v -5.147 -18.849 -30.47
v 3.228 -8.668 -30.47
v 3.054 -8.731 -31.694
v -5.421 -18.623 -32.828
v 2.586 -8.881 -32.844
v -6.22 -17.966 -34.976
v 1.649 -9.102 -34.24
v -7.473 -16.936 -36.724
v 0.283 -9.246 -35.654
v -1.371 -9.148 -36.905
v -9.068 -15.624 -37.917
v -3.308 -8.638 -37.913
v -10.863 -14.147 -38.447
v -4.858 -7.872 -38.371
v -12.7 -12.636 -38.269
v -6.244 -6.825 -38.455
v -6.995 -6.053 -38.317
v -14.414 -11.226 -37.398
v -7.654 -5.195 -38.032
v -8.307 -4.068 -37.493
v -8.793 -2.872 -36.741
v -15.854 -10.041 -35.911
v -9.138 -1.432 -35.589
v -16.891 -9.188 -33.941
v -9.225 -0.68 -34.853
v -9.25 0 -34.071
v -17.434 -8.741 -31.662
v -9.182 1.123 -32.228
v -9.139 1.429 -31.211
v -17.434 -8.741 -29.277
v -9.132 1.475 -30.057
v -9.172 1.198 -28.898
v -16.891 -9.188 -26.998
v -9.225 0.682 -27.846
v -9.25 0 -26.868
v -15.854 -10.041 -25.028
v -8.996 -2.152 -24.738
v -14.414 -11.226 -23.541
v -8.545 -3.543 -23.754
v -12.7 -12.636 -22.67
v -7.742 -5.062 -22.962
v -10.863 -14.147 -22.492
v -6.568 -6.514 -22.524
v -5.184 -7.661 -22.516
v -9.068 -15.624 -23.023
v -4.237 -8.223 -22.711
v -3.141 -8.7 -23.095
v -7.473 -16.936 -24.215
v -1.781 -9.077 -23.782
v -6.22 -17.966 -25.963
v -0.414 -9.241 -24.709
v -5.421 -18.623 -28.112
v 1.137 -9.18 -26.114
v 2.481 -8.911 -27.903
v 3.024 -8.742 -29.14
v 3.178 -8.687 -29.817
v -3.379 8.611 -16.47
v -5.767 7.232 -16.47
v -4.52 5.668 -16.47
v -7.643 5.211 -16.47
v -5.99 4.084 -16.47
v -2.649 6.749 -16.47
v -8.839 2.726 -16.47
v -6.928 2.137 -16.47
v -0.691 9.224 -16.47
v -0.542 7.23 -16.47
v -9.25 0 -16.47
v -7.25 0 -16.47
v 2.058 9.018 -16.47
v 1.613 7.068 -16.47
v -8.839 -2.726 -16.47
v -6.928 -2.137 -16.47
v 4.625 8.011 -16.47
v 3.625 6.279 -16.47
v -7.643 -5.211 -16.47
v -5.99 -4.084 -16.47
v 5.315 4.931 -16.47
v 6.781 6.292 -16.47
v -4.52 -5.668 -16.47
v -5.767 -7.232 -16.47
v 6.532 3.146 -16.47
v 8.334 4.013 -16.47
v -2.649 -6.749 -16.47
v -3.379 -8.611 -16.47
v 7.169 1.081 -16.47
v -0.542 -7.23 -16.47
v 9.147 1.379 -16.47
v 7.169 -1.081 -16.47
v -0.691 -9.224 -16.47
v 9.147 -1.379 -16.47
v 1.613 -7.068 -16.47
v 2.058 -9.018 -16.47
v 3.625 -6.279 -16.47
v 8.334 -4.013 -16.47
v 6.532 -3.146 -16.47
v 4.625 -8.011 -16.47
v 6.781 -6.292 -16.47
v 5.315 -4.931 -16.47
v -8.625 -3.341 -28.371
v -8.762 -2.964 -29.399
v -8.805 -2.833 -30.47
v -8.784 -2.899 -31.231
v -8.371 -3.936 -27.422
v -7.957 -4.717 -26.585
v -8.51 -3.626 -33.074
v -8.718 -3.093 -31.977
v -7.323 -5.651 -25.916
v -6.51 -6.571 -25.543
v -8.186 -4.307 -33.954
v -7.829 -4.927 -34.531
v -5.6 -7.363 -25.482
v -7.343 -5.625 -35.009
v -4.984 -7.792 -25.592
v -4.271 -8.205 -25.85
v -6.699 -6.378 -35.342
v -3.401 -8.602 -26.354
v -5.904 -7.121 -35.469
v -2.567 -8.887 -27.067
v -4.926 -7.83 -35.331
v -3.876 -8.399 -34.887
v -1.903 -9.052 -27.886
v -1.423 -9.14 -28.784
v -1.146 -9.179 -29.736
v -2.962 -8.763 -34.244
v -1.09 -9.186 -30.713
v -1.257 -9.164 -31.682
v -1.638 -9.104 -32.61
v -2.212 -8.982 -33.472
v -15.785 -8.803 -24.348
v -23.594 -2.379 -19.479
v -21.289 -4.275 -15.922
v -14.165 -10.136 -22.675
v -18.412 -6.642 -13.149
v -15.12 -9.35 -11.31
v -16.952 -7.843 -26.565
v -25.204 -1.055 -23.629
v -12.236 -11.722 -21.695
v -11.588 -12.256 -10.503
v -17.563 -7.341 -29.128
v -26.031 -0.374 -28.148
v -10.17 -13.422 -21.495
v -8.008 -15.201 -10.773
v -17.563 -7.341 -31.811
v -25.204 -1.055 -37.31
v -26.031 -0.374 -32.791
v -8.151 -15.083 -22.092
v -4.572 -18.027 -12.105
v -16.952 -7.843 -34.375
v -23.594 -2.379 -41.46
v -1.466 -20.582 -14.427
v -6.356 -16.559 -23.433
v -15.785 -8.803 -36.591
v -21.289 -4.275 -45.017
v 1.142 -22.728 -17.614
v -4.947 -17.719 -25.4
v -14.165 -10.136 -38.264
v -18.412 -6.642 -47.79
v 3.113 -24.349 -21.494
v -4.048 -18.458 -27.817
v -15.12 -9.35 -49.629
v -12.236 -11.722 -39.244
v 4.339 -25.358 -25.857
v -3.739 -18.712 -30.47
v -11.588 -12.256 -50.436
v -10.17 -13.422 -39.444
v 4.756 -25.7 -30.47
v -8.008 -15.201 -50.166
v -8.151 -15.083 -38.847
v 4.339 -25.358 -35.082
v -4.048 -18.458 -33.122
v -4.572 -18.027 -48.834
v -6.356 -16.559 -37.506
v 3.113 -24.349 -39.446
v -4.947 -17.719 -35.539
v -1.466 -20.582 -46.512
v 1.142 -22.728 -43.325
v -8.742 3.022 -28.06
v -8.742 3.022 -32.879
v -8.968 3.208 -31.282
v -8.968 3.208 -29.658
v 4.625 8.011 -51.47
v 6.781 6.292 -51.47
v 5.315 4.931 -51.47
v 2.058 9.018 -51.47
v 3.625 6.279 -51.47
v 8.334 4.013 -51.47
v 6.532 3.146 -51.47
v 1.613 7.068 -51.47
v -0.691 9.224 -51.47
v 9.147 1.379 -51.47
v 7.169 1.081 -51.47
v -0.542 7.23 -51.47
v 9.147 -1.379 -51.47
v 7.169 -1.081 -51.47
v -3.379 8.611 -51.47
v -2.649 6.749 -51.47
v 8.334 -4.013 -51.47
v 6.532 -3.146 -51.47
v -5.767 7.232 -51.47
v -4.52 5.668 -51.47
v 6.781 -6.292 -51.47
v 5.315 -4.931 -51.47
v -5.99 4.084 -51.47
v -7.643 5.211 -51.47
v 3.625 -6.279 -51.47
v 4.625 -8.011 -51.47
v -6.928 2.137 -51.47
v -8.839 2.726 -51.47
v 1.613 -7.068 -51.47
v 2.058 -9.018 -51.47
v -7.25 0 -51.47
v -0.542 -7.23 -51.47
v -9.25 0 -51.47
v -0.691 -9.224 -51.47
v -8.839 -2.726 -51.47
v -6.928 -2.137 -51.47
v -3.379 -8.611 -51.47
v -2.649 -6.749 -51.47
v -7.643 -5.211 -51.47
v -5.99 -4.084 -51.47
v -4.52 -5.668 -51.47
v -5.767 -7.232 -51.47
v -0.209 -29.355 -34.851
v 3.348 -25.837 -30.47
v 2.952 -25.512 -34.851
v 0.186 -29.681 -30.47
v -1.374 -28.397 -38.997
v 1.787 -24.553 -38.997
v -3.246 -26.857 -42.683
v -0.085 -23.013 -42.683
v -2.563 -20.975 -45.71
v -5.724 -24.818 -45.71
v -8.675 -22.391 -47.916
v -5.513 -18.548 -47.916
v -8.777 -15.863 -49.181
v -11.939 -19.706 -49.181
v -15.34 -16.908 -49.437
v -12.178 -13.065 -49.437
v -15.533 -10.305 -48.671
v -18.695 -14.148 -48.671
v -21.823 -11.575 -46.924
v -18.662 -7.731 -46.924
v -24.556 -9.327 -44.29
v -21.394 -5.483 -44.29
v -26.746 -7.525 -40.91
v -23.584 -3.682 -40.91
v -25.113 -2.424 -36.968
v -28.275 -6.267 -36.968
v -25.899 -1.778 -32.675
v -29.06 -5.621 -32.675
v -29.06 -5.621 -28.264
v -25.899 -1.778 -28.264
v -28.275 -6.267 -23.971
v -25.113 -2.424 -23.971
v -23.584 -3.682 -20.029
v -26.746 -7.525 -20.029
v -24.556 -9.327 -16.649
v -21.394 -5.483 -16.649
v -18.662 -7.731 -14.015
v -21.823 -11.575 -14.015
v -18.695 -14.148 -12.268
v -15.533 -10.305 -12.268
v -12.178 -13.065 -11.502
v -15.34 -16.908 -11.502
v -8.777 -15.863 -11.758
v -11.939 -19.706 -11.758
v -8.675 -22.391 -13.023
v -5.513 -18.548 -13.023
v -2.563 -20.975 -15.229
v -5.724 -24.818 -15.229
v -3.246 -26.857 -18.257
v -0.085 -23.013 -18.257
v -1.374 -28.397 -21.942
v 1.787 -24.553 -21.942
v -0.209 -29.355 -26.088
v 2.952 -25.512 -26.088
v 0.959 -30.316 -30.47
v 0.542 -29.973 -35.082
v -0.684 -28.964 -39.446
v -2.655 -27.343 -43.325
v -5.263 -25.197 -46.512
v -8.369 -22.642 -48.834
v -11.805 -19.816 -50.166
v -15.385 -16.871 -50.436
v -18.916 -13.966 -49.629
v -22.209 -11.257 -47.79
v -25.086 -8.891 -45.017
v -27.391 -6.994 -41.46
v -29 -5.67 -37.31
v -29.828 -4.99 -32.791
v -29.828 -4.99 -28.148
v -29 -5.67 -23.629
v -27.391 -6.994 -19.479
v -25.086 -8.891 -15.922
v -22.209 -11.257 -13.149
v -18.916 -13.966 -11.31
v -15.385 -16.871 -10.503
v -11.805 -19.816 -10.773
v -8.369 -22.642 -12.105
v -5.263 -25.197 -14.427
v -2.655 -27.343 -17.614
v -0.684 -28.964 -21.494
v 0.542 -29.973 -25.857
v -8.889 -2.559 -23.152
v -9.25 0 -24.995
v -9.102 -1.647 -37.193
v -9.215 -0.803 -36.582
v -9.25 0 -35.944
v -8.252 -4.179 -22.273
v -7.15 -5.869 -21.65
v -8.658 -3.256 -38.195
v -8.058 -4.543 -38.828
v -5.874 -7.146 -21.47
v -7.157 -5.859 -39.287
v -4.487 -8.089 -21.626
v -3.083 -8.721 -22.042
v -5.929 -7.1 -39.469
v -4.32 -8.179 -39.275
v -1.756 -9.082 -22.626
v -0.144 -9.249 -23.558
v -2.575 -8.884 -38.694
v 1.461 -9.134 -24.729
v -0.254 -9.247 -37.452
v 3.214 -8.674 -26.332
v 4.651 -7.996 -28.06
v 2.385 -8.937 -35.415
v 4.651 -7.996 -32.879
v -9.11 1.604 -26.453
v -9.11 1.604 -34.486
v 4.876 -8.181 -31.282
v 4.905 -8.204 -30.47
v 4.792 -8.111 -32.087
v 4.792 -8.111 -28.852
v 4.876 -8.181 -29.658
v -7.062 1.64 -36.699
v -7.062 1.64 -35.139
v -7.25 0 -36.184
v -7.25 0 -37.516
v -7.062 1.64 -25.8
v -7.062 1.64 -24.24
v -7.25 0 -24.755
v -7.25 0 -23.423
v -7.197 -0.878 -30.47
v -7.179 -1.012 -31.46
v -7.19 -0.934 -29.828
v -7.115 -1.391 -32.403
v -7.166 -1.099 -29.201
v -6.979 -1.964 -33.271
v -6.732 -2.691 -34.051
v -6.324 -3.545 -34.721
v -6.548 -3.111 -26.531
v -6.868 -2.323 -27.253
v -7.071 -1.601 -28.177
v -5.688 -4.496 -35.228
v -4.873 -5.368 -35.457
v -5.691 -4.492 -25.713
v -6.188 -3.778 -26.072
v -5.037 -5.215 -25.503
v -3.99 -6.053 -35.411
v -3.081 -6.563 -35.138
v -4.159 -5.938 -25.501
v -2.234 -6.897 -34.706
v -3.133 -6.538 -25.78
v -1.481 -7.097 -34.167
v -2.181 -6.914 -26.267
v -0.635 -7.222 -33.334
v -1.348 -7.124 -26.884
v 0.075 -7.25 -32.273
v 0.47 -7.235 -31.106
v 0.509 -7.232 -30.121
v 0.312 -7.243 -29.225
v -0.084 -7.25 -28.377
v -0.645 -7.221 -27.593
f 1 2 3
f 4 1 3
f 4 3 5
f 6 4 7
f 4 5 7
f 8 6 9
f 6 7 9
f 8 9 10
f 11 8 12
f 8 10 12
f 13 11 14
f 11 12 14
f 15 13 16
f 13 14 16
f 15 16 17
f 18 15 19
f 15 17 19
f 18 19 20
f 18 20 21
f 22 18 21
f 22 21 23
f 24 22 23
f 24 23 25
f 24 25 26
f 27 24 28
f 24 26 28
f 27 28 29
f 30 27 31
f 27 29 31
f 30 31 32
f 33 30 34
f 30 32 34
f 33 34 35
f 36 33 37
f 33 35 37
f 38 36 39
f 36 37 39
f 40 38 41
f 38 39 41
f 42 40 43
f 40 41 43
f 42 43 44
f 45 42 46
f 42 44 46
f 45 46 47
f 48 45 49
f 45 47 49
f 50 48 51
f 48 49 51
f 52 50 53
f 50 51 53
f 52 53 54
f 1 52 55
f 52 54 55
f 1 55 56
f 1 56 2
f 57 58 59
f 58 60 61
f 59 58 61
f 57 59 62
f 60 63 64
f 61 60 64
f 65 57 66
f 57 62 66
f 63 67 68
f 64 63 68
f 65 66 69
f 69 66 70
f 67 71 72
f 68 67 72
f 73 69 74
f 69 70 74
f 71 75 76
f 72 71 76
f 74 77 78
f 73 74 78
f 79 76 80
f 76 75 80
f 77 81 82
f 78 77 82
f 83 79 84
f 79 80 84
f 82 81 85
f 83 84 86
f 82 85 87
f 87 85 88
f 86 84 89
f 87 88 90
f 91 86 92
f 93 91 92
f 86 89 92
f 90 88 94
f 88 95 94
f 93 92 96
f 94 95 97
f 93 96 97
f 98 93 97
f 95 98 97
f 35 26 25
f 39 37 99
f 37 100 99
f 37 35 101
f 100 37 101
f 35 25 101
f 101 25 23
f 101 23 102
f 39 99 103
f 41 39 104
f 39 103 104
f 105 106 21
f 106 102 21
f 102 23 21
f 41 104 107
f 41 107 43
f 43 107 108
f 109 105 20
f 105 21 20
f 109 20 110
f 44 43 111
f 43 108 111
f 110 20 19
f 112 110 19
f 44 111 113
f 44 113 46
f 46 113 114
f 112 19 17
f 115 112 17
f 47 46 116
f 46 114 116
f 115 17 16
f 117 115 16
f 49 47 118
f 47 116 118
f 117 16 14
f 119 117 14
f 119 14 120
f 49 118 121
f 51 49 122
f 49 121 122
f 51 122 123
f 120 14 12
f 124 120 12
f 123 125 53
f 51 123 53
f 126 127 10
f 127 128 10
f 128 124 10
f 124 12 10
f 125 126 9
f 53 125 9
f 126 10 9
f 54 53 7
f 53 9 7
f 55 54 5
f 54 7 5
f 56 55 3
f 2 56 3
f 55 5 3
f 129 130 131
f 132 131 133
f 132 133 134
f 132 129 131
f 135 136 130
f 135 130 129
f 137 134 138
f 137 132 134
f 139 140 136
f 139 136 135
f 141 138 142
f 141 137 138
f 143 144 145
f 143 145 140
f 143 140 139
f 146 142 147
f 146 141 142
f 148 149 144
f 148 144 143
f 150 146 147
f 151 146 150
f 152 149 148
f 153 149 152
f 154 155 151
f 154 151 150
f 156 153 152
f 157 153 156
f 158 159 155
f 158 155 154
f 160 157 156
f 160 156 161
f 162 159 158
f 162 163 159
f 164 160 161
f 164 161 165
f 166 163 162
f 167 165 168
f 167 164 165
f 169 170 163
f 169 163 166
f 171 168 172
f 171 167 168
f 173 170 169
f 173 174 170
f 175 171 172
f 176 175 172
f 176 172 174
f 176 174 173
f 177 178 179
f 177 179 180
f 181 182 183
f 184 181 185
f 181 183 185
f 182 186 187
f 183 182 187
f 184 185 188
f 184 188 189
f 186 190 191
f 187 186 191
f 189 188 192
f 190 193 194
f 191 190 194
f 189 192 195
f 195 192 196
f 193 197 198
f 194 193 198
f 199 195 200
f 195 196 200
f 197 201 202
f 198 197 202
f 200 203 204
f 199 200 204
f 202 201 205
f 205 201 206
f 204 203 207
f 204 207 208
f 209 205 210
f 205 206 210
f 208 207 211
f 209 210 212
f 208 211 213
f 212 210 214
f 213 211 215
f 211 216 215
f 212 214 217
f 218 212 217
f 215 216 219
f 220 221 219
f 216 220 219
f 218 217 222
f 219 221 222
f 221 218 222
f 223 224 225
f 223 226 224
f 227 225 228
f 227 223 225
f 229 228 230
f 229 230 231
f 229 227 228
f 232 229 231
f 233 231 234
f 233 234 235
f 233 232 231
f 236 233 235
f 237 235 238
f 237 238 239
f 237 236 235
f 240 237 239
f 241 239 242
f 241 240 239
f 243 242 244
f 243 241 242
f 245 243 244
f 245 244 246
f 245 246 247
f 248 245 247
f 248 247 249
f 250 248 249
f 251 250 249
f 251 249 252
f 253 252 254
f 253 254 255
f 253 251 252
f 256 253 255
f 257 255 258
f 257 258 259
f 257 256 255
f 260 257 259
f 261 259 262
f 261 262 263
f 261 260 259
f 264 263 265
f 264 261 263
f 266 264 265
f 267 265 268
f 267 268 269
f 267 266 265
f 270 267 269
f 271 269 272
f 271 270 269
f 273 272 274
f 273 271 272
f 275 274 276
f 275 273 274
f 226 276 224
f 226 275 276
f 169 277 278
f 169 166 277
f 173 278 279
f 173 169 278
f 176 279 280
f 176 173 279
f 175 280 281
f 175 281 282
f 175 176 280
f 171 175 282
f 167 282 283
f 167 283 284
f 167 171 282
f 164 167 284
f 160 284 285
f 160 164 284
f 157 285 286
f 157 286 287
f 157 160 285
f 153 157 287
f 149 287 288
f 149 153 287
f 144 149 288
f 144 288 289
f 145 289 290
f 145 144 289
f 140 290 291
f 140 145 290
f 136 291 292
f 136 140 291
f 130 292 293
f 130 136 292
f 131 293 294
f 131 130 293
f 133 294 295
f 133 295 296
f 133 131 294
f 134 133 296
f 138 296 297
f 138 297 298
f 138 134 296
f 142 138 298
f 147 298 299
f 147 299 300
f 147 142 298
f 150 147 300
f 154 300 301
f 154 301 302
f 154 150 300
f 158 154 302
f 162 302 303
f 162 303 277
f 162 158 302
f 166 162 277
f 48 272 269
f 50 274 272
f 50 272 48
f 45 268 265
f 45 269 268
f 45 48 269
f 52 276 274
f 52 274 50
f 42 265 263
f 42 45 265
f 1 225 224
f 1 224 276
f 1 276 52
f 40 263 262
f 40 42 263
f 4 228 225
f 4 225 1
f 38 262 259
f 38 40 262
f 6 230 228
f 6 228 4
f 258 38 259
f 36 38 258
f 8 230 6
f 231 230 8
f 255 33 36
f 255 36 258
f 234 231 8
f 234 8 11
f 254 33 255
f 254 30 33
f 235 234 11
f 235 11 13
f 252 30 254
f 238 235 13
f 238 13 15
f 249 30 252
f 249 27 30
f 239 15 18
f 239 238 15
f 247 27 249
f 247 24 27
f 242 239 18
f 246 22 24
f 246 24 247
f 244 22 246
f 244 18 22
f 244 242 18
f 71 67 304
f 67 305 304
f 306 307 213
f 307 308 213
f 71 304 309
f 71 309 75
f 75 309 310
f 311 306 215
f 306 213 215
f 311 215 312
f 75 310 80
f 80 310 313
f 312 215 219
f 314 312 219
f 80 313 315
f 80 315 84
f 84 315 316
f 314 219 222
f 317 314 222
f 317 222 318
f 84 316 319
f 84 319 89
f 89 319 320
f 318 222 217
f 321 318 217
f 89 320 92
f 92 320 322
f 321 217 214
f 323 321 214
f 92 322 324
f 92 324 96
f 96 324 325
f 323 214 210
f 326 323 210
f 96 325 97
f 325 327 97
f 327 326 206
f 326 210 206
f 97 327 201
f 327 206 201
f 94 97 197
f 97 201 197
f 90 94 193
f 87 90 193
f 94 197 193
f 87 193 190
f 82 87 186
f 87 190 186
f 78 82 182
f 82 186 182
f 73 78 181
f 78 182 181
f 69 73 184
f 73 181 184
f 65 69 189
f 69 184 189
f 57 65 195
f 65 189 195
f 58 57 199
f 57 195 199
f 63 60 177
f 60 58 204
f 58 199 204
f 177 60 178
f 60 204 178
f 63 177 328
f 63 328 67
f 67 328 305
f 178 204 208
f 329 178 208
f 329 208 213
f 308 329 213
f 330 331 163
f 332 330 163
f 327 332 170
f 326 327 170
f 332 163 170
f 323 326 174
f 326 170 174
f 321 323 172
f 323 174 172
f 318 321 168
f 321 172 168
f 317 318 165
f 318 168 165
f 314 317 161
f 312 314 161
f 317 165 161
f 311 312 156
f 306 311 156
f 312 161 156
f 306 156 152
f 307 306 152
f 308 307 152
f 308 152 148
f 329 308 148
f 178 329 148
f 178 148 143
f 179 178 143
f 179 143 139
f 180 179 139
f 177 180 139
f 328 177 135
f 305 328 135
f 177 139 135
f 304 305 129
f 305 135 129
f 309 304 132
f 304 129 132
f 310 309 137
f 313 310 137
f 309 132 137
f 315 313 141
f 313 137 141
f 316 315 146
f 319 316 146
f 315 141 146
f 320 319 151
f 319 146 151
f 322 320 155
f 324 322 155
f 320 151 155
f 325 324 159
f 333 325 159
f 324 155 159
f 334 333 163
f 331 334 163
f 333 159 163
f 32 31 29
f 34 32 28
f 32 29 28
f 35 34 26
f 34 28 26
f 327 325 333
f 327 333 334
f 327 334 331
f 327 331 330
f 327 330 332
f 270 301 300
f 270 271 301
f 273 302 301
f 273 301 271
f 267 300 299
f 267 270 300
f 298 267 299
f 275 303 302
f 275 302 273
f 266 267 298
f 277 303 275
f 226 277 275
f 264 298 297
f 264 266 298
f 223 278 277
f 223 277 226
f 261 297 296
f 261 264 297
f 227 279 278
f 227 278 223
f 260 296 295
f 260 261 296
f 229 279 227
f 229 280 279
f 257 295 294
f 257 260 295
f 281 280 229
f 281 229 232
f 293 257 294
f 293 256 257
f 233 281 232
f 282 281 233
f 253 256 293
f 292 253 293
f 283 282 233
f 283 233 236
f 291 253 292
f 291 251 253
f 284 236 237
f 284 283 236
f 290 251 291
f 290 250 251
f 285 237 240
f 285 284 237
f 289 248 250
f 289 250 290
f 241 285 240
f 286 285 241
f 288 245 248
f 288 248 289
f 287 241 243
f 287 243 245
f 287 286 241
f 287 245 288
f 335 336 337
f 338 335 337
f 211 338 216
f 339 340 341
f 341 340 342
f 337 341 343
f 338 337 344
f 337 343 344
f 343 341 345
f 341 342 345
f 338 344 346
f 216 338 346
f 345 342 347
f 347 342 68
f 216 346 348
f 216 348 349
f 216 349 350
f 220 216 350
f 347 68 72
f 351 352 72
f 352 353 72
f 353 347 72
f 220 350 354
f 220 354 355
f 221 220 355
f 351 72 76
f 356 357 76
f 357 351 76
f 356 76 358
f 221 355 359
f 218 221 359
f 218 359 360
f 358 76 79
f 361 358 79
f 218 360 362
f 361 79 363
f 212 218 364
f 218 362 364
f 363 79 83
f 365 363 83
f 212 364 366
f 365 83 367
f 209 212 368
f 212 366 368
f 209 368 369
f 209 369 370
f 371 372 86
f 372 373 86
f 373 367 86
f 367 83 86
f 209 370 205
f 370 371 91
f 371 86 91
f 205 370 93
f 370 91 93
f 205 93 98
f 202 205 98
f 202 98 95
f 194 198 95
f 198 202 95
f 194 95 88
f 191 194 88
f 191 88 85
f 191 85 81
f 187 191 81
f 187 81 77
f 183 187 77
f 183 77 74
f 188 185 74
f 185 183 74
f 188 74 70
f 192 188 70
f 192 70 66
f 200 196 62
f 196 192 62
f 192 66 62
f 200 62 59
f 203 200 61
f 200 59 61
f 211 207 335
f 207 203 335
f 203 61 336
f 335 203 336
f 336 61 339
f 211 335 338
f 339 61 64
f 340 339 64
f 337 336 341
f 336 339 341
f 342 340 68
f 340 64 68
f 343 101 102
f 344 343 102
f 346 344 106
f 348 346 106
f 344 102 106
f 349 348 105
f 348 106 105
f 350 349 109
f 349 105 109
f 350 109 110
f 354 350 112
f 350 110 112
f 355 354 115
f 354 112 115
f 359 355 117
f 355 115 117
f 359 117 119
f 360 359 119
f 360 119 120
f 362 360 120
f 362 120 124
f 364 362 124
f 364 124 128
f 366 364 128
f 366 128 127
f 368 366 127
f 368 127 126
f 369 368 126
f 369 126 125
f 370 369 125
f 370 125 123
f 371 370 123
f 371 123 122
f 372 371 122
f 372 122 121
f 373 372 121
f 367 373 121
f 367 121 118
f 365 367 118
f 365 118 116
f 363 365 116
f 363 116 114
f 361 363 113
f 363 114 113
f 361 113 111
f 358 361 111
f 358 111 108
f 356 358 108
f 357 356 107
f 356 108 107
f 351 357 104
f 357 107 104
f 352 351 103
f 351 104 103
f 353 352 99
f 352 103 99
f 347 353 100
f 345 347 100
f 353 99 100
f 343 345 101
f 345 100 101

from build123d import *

# Parameters (mm, degrees)
TROU_DE_PASSAGE_D_AXE_3_321_REACH  = 32.636
TROU_DE_PASSAGE_D_AXE_3_321_BORE_R = 5
TROU_DE_PASSAGE_D_AXE_3_322_D      = 14.5


with BuildPart() as part:
    # Esquisse1 → Révolution1 (revolve)
    with BuildSketch(Plane(origin=(0, 0, 0), x_dir=(1, 0, 0), z_dir=(0, 1, 0)), mode=Mode.PRIVATE) as r_volution1_sk:
        Polygon((7.250000000000006, 51.46955999467971), (7.2500000000000115, 16.46955999467971), (9.250000000000007, 16.46955999467971), (9.250000000000007, 51.46955999467971), align=None)
    revolve(r_volution1_sk.sketch.rotate(Axis((0, 0, -65.50671272050145), (0, 0, 1)), 180), axis=Axis((0, 0, -65.50671272050145), (0, 0, 1)))

    # Trou de passage d'axe 3/321 bore (on position points) → Trou de passage d'axe 3/321 (cut, up to next)
    with BuildSketch(Plane(origin=(-5.876504309, -7.143472342, -30.469559995), x_dir=(-0.772267280236, 0.635297763161, 0), z_dir=(-0.635297763161, -0.772267280236, 0)), mode=Mode.PRIVATE) as trou_de_passage_d_axe_3_321_sk1:
        Circle(TROU_DE_PASSAGE_D_AXE_3_321_BORE_R)
    trou_de_passage_d_axe_3_321_tool1 = extrude(trou_de_passage_d_axe_3_321_sk1.sketch, amount=-TROU_DE_PASSAGE_D_AXE_3_321_REACH, mode=Mode.PRIVATE) & part.part
    add(trou_de_passage_d_axe_3_321_tool1.solids().sort_by_distance((-5.876504, -7.143472, -30.46956))[0], mode=Mode.SUBTRACT)

    # Esquisse6 → Révolution2 (revolve)
    with BuildSketch(Plane(origin=(0, 0, 0), x_dir=(0, 0, -1), z_dir=(0.7722672802355546, -0.6352977631611647, 0)), mode=Mode.PRIVATE) as r_volution2_sk:
        Polygon((22.469559994679706, -16.22010142633931), (22.469559994679706, -17.826400392261572), (11.469559994679708, -17.826400392261572), (11.469559994679708, -22.802862204144958), (10.469559994679706, -22.802862204144958), (10.469559994679706, -16.826400392261576), (21.469559994679706, -16.826400392261572), (21.469559994679706, -16.22010142633931), (21.469559994679706, -3.2201014263393115), (22.469559994679706, -3.2201014263393115), align=None)
    revolve(r_volution2_sk.sketch.rotate(Axis((-13.132857470311126, -15.964287470260585, -30.469559994679706), (0.6352977631611647, 0.7722672802355546, 0)), 90), axis=Axis((-13.132857470311126, -15.964287470260585, -30.469559994679706), (0.6352977631611647, 0.7722672802355546, 0)))

    # Trou de passage d'axe 3/322 (through all)
    with Locations(Plane(origin=(0, 0, -39.469559995), x_dir=(0, -1, 0), z_dir=(0, 0, -1))):
        with Locations((0, 0)):
            Hole(TROU_DE_PASSAGE_D_AXE_3_322_D / 2)


solid = part.part
